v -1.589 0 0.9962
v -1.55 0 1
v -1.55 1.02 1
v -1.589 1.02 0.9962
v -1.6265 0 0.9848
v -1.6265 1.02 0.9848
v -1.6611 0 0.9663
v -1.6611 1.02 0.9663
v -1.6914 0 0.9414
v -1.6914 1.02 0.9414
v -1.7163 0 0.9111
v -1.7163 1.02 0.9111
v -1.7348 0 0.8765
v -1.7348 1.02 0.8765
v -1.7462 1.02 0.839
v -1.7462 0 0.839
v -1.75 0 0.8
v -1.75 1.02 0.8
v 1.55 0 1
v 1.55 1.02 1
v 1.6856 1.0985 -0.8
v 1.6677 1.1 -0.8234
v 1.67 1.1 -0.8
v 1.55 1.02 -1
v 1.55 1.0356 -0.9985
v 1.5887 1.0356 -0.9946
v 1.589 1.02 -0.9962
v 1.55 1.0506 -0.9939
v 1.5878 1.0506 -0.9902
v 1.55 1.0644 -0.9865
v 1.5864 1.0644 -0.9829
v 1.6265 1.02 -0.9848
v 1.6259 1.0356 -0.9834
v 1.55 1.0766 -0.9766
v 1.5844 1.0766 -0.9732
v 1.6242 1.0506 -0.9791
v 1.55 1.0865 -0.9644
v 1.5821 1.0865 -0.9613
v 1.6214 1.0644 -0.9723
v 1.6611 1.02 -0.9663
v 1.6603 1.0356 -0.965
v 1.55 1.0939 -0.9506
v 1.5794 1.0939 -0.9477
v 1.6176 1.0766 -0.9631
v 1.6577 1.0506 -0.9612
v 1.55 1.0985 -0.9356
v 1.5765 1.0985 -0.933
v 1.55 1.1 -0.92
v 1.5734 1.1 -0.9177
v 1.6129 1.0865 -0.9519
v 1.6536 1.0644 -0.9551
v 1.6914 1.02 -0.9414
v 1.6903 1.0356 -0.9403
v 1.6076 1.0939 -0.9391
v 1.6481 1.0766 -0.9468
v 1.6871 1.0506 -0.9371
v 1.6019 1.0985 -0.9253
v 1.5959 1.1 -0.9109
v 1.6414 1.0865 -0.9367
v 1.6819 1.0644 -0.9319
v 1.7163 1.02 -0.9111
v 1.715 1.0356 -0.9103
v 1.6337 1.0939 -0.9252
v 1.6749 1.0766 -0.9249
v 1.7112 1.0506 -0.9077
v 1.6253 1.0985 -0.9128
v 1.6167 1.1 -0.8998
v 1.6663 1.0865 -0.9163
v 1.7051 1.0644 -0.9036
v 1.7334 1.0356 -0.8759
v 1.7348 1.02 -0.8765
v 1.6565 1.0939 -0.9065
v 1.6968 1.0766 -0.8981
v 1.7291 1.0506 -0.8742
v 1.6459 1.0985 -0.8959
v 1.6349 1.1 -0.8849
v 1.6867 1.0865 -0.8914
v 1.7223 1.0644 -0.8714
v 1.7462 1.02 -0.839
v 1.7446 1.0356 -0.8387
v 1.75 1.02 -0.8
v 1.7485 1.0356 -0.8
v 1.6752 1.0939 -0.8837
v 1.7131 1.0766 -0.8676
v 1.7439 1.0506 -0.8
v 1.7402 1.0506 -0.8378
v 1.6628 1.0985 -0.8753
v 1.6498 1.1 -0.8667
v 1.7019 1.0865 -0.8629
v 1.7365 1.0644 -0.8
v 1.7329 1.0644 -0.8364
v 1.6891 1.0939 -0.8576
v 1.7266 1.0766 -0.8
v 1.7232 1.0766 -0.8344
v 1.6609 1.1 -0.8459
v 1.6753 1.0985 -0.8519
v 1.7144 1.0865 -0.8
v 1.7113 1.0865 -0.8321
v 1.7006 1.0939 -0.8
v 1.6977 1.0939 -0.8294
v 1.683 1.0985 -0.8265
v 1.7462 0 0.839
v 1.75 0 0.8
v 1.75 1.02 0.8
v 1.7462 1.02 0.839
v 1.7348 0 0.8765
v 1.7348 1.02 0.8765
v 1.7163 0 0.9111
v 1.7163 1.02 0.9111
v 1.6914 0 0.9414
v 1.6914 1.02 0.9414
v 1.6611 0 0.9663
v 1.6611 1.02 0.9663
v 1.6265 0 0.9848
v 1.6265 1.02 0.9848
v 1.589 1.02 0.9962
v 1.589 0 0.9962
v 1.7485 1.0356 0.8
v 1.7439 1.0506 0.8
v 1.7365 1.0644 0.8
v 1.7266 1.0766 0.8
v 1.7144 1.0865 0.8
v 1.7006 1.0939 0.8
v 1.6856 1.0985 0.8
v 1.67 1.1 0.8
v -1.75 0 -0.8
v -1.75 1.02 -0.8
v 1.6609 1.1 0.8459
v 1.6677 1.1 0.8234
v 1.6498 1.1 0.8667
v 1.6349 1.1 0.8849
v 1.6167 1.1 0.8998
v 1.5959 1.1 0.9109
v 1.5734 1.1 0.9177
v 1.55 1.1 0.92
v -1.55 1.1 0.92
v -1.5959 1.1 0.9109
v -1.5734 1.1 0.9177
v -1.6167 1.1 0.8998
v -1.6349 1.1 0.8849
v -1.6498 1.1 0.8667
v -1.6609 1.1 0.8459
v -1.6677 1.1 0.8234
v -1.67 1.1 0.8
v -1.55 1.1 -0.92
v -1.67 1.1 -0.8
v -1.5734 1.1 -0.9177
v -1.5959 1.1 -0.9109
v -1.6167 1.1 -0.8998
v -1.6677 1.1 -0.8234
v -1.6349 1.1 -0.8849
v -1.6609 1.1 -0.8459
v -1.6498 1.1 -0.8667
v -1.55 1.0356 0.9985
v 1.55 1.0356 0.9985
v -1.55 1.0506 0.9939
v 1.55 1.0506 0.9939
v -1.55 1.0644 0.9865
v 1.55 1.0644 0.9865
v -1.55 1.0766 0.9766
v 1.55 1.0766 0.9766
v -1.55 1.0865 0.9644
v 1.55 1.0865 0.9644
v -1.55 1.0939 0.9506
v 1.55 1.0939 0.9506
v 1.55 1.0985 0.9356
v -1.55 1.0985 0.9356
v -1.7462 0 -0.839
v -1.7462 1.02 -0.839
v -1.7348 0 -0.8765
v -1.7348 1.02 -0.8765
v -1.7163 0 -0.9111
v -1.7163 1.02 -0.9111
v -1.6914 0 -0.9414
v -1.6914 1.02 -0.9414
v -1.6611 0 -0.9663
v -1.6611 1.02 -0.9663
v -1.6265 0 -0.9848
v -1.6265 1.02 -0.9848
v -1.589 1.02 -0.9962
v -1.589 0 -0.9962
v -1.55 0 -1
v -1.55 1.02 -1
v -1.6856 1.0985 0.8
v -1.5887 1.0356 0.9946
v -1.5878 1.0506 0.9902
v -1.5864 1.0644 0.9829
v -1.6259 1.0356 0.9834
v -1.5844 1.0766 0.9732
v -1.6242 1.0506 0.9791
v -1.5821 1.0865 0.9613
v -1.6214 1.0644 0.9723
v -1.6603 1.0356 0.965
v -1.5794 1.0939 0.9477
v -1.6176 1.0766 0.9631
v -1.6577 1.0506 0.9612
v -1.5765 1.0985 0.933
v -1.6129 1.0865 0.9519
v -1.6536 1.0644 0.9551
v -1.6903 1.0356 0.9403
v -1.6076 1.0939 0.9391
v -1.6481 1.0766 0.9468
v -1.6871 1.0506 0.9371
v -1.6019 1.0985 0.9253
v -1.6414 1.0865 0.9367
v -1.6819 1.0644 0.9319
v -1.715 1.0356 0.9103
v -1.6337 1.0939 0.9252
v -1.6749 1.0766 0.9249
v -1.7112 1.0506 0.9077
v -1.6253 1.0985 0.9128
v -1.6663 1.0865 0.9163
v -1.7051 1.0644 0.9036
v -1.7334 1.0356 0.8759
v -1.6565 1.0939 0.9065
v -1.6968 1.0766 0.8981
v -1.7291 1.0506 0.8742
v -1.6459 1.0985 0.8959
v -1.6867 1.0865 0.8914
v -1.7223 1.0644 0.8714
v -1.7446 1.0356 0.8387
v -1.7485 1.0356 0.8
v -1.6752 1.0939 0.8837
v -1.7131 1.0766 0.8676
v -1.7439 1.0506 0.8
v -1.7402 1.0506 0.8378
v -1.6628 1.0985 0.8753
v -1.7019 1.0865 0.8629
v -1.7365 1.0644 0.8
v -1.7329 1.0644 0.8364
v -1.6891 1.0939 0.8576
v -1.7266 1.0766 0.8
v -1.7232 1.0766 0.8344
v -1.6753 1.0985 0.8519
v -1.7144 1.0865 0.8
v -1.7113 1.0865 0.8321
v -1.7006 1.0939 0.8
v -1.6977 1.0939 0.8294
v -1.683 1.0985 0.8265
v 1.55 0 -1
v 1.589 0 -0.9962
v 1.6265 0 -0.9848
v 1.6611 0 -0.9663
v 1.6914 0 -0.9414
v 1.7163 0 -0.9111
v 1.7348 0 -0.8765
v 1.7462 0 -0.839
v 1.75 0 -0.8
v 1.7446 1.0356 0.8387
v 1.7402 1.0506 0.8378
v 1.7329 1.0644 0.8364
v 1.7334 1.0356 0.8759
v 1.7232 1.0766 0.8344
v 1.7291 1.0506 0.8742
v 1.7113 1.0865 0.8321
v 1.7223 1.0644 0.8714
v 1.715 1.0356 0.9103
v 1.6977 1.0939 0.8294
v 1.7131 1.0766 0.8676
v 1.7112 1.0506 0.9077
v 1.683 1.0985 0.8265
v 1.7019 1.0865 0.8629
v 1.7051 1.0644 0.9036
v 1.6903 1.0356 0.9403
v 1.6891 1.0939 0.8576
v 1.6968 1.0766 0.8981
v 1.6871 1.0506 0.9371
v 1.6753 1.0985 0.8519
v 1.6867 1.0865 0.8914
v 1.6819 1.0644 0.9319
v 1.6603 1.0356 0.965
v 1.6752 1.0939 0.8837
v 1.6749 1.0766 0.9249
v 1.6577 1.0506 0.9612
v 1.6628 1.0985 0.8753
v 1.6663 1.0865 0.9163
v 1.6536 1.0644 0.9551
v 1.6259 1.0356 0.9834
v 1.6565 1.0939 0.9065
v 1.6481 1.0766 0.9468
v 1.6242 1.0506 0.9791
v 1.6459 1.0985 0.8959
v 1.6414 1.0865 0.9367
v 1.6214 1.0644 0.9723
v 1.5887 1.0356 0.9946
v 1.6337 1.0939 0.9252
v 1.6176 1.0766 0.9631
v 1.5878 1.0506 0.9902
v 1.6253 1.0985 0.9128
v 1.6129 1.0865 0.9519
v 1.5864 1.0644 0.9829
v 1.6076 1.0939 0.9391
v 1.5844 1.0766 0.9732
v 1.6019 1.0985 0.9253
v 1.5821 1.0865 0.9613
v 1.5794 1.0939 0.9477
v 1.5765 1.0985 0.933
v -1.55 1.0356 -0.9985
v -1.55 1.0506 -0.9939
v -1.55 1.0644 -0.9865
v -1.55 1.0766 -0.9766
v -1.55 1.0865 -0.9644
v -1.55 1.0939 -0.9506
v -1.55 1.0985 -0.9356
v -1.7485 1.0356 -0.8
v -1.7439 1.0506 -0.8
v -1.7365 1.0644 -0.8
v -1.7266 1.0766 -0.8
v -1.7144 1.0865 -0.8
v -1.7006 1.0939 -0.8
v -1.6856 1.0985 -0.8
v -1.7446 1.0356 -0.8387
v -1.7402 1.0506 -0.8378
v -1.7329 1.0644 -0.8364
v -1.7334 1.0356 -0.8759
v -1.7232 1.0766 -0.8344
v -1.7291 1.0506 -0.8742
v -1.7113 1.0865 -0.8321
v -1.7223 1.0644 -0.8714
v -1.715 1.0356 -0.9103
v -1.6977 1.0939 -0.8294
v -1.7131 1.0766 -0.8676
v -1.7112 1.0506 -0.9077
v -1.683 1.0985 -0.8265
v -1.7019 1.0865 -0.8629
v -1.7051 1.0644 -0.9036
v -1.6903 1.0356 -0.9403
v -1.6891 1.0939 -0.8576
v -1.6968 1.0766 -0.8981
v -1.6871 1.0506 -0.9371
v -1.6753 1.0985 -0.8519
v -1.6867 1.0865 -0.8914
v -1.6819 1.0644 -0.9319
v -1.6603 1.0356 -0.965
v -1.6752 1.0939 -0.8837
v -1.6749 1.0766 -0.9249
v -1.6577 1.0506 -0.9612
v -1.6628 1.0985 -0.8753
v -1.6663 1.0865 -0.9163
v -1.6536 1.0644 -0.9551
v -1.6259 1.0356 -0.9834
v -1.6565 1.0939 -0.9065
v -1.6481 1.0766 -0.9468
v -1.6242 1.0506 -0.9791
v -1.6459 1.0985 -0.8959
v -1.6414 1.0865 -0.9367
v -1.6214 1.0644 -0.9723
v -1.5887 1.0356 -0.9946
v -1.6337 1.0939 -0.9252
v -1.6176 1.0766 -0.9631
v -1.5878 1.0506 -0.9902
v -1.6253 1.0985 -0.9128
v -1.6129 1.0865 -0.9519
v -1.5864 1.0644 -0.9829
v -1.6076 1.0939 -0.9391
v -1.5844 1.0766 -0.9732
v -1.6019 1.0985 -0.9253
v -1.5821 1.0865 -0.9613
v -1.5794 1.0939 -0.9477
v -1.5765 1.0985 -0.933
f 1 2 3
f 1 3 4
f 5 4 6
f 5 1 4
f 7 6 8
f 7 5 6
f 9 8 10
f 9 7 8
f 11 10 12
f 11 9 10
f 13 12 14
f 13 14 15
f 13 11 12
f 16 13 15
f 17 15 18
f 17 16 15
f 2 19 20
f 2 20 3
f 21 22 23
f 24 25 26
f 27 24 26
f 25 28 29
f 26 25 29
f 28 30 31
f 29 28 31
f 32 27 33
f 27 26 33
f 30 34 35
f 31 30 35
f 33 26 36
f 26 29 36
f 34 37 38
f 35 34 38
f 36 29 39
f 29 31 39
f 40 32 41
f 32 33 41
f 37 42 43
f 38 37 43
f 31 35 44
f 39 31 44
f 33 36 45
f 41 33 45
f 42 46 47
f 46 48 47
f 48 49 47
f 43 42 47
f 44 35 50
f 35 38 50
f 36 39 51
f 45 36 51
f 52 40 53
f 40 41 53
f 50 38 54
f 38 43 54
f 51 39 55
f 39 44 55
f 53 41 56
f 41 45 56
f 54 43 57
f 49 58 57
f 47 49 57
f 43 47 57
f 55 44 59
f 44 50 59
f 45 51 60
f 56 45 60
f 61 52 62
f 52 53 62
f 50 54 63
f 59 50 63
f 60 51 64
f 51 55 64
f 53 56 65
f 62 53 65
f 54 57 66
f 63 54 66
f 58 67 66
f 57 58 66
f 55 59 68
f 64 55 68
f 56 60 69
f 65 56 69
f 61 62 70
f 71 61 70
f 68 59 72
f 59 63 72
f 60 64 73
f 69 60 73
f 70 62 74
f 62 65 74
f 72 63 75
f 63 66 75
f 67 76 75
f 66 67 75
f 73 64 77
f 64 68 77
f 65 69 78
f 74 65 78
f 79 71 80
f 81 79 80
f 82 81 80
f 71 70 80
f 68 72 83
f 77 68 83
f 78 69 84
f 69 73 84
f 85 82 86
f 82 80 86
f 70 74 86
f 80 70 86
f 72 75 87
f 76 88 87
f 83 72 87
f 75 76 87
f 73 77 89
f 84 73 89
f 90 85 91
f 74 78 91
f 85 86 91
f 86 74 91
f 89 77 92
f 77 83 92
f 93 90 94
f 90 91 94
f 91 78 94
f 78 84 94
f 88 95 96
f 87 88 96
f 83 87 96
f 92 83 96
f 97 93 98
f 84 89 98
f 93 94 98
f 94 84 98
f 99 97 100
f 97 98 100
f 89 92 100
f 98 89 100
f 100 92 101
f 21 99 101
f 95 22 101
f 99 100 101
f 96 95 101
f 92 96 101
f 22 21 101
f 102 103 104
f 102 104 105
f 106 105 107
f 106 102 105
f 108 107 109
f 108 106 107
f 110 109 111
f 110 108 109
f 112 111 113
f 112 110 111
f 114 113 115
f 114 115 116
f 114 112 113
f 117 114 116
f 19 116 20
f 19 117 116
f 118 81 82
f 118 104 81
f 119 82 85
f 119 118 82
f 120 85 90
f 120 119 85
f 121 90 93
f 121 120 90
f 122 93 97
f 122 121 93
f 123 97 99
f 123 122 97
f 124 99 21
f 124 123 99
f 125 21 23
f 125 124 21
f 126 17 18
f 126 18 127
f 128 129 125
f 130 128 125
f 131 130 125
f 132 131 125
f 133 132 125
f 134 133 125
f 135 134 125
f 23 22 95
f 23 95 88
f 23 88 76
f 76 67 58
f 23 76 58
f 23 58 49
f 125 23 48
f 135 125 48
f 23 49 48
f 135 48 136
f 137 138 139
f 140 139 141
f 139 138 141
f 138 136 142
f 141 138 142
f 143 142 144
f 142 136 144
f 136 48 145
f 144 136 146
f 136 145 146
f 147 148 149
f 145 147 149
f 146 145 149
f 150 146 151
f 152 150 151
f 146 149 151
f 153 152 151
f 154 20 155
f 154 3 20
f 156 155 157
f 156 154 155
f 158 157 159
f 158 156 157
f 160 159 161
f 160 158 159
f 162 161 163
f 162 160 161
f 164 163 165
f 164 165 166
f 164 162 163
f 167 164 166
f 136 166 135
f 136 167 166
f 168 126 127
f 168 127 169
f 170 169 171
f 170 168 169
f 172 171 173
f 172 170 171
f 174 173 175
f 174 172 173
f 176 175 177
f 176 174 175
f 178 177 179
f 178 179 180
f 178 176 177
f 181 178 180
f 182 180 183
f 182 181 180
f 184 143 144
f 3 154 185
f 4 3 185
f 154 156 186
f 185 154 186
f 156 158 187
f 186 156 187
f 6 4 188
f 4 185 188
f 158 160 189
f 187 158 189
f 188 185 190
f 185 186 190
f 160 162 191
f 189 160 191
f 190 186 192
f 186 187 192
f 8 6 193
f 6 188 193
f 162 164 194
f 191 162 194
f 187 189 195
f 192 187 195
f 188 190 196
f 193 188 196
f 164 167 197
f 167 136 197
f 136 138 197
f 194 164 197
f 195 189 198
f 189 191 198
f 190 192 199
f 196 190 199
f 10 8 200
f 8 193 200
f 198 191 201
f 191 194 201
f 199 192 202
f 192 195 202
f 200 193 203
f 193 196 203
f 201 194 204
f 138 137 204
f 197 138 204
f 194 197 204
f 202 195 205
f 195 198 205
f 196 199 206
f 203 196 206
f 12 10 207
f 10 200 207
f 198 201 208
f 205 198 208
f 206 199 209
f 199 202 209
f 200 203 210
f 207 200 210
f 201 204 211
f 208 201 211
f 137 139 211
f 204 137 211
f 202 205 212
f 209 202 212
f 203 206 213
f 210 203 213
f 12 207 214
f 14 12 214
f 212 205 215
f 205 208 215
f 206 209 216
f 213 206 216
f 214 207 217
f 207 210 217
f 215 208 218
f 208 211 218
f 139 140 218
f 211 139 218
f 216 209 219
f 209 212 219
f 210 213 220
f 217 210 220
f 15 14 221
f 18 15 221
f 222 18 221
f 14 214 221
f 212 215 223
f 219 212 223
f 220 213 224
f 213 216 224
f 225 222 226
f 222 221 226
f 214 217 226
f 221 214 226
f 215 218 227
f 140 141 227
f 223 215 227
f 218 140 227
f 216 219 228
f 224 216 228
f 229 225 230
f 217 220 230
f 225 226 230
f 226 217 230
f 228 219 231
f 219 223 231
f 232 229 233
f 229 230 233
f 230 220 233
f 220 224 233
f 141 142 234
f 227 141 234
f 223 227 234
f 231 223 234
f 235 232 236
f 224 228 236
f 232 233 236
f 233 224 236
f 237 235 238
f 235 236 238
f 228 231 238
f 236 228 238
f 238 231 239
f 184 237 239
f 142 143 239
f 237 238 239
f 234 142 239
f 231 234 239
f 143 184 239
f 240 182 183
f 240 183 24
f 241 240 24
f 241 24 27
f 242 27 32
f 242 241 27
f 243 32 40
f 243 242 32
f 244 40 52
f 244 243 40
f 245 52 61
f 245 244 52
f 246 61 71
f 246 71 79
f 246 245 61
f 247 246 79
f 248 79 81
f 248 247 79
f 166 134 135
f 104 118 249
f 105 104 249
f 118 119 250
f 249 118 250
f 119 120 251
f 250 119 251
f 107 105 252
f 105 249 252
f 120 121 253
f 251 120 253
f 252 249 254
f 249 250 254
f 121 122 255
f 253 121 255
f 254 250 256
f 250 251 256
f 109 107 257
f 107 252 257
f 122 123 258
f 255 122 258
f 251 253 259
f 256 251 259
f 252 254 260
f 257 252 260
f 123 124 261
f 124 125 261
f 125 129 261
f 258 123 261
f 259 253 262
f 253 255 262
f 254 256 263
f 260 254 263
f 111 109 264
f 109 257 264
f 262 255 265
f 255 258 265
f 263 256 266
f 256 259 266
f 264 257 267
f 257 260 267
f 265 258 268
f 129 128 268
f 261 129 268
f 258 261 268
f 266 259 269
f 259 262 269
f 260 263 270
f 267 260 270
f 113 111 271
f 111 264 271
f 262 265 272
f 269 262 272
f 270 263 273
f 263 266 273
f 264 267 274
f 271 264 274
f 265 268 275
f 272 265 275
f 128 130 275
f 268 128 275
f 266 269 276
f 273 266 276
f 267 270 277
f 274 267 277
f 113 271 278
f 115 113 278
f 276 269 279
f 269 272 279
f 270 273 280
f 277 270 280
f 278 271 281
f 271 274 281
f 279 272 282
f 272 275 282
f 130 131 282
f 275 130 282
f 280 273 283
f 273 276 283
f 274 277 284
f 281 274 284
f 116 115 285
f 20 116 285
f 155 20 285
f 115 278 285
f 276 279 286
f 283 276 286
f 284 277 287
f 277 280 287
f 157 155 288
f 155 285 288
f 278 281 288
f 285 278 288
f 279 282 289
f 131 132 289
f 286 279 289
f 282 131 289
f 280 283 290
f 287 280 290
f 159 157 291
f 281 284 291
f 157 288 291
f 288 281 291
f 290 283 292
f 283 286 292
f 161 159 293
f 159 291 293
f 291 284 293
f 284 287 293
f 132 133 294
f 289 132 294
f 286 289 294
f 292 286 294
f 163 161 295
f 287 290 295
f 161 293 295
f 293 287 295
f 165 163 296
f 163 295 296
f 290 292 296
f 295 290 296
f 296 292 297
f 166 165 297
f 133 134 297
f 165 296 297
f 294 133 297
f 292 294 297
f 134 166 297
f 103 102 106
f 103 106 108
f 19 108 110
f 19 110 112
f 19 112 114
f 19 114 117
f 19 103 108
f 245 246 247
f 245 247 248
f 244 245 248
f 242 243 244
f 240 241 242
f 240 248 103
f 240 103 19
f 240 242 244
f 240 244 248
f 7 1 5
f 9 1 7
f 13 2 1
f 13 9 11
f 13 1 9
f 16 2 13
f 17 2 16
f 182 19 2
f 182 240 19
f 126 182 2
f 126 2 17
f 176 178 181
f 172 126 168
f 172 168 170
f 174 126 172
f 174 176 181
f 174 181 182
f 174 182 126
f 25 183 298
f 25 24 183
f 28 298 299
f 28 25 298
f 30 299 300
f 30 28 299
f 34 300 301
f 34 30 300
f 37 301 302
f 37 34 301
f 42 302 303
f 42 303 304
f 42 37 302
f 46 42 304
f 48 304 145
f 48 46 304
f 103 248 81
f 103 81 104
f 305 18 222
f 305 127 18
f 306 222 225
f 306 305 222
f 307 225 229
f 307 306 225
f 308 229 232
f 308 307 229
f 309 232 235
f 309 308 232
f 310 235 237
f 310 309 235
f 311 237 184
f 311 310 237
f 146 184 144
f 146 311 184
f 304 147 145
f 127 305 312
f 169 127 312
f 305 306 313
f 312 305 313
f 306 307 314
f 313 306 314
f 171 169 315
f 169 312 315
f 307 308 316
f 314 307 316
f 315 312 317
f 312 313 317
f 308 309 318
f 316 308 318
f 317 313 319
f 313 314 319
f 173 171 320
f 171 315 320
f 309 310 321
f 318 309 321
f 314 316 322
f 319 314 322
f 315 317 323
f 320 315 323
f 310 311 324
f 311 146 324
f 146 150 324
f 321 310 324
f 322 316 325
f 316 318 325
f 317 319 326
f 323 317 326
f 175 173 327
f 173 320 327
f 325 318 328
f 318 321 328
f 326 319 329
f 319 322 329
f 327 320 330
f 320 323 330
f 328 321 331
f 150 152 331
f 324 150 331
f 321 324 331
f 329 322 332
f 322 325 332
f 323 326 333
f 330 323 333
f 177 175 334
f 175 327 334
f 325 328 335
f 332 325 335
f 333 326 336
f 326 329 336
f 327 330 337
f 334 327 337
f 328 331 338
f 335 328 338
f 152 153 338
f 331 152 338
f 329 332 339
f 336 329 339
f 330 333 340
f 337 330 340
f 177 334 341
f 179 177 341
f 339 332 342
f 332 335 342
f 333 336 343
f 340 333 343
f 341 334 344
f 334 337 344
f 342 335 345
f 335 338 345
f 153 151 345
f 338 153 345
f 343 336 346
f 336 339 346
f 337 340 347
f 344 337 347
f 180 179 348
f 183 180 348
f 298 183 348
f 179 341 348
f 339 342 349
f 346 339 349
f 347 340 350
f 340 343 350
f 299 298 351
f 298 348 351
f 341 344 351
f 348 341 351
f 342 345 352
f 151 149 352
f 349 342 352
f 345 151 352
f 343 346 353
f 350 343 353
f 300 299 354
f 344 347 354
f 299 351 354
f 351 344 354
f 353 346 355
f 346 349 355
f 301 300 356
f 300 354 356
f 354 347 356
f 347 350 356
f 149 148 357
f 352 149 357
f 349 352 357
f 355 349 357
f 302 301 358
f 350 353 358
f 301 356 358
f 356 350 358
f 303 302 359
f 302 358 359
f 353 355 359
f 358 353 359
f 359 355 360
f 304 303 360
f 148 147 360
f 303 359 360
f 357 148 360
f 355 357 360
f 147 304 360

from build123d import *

# Parameters (mm, degrees)
BOSS_EXTRU_1_DEPTH = 1.1
CONG_1_R           = 0.08


with BuildPart() as part:
    # Esquisse1 → Boss.-Extru.1 (new body)
    with BuildSketch(Plane(origin=(0, 0, 0), x_dir=(1, 0, 0), z_dir=(0, 1, 0))):
        with BuildLine():
            Line((1.55, -1), (-1.55, -1))
            ThreePointArc((-1.55, -1), (-1.691421356, -0.941421356), (-1.75, -0.8))
            Line((-1.75, -0.8), (-1.75, 0.8))
            ThreePointArc((-1.75, 0.8), (-1.691421356, 0.941421356), (-1.55, 1))
            Line((-1.55, 1), (1.55, 1))
            ThreePointArc((1.55, 1), (1.691421356, 0.941421356), (1.75, 0.8))
            Line((1.75, 0.8), (1.75, -0.8))
            ThreePointArc((1.75, -0.8), (1.691421356, -0.941421356), (1.55, -1))
        make_face()
    extrude(amount=BOSS_EXTRU_1_DEPTH)

    # Congé1
    cong_1_edges = [part.edges().sort_by_distance(p)[0] for p in [
        (-1.691421356, 1.1, -0.941421356),
        (-1.75, 1.1, 0),
        (-1.691421356, 1.1, 0.941421356),
        (0, 1.1, 1),
        (1.691421356, 1.1, 0.941421356),
        (1.75, 1.1, 0),
        (1.691421356, 1.1, -0.941421356),
        (0, 1.1, -1),
    ]]
    fillet(cong_1_edges, radius=CONG_1_R)


solid = part.part
